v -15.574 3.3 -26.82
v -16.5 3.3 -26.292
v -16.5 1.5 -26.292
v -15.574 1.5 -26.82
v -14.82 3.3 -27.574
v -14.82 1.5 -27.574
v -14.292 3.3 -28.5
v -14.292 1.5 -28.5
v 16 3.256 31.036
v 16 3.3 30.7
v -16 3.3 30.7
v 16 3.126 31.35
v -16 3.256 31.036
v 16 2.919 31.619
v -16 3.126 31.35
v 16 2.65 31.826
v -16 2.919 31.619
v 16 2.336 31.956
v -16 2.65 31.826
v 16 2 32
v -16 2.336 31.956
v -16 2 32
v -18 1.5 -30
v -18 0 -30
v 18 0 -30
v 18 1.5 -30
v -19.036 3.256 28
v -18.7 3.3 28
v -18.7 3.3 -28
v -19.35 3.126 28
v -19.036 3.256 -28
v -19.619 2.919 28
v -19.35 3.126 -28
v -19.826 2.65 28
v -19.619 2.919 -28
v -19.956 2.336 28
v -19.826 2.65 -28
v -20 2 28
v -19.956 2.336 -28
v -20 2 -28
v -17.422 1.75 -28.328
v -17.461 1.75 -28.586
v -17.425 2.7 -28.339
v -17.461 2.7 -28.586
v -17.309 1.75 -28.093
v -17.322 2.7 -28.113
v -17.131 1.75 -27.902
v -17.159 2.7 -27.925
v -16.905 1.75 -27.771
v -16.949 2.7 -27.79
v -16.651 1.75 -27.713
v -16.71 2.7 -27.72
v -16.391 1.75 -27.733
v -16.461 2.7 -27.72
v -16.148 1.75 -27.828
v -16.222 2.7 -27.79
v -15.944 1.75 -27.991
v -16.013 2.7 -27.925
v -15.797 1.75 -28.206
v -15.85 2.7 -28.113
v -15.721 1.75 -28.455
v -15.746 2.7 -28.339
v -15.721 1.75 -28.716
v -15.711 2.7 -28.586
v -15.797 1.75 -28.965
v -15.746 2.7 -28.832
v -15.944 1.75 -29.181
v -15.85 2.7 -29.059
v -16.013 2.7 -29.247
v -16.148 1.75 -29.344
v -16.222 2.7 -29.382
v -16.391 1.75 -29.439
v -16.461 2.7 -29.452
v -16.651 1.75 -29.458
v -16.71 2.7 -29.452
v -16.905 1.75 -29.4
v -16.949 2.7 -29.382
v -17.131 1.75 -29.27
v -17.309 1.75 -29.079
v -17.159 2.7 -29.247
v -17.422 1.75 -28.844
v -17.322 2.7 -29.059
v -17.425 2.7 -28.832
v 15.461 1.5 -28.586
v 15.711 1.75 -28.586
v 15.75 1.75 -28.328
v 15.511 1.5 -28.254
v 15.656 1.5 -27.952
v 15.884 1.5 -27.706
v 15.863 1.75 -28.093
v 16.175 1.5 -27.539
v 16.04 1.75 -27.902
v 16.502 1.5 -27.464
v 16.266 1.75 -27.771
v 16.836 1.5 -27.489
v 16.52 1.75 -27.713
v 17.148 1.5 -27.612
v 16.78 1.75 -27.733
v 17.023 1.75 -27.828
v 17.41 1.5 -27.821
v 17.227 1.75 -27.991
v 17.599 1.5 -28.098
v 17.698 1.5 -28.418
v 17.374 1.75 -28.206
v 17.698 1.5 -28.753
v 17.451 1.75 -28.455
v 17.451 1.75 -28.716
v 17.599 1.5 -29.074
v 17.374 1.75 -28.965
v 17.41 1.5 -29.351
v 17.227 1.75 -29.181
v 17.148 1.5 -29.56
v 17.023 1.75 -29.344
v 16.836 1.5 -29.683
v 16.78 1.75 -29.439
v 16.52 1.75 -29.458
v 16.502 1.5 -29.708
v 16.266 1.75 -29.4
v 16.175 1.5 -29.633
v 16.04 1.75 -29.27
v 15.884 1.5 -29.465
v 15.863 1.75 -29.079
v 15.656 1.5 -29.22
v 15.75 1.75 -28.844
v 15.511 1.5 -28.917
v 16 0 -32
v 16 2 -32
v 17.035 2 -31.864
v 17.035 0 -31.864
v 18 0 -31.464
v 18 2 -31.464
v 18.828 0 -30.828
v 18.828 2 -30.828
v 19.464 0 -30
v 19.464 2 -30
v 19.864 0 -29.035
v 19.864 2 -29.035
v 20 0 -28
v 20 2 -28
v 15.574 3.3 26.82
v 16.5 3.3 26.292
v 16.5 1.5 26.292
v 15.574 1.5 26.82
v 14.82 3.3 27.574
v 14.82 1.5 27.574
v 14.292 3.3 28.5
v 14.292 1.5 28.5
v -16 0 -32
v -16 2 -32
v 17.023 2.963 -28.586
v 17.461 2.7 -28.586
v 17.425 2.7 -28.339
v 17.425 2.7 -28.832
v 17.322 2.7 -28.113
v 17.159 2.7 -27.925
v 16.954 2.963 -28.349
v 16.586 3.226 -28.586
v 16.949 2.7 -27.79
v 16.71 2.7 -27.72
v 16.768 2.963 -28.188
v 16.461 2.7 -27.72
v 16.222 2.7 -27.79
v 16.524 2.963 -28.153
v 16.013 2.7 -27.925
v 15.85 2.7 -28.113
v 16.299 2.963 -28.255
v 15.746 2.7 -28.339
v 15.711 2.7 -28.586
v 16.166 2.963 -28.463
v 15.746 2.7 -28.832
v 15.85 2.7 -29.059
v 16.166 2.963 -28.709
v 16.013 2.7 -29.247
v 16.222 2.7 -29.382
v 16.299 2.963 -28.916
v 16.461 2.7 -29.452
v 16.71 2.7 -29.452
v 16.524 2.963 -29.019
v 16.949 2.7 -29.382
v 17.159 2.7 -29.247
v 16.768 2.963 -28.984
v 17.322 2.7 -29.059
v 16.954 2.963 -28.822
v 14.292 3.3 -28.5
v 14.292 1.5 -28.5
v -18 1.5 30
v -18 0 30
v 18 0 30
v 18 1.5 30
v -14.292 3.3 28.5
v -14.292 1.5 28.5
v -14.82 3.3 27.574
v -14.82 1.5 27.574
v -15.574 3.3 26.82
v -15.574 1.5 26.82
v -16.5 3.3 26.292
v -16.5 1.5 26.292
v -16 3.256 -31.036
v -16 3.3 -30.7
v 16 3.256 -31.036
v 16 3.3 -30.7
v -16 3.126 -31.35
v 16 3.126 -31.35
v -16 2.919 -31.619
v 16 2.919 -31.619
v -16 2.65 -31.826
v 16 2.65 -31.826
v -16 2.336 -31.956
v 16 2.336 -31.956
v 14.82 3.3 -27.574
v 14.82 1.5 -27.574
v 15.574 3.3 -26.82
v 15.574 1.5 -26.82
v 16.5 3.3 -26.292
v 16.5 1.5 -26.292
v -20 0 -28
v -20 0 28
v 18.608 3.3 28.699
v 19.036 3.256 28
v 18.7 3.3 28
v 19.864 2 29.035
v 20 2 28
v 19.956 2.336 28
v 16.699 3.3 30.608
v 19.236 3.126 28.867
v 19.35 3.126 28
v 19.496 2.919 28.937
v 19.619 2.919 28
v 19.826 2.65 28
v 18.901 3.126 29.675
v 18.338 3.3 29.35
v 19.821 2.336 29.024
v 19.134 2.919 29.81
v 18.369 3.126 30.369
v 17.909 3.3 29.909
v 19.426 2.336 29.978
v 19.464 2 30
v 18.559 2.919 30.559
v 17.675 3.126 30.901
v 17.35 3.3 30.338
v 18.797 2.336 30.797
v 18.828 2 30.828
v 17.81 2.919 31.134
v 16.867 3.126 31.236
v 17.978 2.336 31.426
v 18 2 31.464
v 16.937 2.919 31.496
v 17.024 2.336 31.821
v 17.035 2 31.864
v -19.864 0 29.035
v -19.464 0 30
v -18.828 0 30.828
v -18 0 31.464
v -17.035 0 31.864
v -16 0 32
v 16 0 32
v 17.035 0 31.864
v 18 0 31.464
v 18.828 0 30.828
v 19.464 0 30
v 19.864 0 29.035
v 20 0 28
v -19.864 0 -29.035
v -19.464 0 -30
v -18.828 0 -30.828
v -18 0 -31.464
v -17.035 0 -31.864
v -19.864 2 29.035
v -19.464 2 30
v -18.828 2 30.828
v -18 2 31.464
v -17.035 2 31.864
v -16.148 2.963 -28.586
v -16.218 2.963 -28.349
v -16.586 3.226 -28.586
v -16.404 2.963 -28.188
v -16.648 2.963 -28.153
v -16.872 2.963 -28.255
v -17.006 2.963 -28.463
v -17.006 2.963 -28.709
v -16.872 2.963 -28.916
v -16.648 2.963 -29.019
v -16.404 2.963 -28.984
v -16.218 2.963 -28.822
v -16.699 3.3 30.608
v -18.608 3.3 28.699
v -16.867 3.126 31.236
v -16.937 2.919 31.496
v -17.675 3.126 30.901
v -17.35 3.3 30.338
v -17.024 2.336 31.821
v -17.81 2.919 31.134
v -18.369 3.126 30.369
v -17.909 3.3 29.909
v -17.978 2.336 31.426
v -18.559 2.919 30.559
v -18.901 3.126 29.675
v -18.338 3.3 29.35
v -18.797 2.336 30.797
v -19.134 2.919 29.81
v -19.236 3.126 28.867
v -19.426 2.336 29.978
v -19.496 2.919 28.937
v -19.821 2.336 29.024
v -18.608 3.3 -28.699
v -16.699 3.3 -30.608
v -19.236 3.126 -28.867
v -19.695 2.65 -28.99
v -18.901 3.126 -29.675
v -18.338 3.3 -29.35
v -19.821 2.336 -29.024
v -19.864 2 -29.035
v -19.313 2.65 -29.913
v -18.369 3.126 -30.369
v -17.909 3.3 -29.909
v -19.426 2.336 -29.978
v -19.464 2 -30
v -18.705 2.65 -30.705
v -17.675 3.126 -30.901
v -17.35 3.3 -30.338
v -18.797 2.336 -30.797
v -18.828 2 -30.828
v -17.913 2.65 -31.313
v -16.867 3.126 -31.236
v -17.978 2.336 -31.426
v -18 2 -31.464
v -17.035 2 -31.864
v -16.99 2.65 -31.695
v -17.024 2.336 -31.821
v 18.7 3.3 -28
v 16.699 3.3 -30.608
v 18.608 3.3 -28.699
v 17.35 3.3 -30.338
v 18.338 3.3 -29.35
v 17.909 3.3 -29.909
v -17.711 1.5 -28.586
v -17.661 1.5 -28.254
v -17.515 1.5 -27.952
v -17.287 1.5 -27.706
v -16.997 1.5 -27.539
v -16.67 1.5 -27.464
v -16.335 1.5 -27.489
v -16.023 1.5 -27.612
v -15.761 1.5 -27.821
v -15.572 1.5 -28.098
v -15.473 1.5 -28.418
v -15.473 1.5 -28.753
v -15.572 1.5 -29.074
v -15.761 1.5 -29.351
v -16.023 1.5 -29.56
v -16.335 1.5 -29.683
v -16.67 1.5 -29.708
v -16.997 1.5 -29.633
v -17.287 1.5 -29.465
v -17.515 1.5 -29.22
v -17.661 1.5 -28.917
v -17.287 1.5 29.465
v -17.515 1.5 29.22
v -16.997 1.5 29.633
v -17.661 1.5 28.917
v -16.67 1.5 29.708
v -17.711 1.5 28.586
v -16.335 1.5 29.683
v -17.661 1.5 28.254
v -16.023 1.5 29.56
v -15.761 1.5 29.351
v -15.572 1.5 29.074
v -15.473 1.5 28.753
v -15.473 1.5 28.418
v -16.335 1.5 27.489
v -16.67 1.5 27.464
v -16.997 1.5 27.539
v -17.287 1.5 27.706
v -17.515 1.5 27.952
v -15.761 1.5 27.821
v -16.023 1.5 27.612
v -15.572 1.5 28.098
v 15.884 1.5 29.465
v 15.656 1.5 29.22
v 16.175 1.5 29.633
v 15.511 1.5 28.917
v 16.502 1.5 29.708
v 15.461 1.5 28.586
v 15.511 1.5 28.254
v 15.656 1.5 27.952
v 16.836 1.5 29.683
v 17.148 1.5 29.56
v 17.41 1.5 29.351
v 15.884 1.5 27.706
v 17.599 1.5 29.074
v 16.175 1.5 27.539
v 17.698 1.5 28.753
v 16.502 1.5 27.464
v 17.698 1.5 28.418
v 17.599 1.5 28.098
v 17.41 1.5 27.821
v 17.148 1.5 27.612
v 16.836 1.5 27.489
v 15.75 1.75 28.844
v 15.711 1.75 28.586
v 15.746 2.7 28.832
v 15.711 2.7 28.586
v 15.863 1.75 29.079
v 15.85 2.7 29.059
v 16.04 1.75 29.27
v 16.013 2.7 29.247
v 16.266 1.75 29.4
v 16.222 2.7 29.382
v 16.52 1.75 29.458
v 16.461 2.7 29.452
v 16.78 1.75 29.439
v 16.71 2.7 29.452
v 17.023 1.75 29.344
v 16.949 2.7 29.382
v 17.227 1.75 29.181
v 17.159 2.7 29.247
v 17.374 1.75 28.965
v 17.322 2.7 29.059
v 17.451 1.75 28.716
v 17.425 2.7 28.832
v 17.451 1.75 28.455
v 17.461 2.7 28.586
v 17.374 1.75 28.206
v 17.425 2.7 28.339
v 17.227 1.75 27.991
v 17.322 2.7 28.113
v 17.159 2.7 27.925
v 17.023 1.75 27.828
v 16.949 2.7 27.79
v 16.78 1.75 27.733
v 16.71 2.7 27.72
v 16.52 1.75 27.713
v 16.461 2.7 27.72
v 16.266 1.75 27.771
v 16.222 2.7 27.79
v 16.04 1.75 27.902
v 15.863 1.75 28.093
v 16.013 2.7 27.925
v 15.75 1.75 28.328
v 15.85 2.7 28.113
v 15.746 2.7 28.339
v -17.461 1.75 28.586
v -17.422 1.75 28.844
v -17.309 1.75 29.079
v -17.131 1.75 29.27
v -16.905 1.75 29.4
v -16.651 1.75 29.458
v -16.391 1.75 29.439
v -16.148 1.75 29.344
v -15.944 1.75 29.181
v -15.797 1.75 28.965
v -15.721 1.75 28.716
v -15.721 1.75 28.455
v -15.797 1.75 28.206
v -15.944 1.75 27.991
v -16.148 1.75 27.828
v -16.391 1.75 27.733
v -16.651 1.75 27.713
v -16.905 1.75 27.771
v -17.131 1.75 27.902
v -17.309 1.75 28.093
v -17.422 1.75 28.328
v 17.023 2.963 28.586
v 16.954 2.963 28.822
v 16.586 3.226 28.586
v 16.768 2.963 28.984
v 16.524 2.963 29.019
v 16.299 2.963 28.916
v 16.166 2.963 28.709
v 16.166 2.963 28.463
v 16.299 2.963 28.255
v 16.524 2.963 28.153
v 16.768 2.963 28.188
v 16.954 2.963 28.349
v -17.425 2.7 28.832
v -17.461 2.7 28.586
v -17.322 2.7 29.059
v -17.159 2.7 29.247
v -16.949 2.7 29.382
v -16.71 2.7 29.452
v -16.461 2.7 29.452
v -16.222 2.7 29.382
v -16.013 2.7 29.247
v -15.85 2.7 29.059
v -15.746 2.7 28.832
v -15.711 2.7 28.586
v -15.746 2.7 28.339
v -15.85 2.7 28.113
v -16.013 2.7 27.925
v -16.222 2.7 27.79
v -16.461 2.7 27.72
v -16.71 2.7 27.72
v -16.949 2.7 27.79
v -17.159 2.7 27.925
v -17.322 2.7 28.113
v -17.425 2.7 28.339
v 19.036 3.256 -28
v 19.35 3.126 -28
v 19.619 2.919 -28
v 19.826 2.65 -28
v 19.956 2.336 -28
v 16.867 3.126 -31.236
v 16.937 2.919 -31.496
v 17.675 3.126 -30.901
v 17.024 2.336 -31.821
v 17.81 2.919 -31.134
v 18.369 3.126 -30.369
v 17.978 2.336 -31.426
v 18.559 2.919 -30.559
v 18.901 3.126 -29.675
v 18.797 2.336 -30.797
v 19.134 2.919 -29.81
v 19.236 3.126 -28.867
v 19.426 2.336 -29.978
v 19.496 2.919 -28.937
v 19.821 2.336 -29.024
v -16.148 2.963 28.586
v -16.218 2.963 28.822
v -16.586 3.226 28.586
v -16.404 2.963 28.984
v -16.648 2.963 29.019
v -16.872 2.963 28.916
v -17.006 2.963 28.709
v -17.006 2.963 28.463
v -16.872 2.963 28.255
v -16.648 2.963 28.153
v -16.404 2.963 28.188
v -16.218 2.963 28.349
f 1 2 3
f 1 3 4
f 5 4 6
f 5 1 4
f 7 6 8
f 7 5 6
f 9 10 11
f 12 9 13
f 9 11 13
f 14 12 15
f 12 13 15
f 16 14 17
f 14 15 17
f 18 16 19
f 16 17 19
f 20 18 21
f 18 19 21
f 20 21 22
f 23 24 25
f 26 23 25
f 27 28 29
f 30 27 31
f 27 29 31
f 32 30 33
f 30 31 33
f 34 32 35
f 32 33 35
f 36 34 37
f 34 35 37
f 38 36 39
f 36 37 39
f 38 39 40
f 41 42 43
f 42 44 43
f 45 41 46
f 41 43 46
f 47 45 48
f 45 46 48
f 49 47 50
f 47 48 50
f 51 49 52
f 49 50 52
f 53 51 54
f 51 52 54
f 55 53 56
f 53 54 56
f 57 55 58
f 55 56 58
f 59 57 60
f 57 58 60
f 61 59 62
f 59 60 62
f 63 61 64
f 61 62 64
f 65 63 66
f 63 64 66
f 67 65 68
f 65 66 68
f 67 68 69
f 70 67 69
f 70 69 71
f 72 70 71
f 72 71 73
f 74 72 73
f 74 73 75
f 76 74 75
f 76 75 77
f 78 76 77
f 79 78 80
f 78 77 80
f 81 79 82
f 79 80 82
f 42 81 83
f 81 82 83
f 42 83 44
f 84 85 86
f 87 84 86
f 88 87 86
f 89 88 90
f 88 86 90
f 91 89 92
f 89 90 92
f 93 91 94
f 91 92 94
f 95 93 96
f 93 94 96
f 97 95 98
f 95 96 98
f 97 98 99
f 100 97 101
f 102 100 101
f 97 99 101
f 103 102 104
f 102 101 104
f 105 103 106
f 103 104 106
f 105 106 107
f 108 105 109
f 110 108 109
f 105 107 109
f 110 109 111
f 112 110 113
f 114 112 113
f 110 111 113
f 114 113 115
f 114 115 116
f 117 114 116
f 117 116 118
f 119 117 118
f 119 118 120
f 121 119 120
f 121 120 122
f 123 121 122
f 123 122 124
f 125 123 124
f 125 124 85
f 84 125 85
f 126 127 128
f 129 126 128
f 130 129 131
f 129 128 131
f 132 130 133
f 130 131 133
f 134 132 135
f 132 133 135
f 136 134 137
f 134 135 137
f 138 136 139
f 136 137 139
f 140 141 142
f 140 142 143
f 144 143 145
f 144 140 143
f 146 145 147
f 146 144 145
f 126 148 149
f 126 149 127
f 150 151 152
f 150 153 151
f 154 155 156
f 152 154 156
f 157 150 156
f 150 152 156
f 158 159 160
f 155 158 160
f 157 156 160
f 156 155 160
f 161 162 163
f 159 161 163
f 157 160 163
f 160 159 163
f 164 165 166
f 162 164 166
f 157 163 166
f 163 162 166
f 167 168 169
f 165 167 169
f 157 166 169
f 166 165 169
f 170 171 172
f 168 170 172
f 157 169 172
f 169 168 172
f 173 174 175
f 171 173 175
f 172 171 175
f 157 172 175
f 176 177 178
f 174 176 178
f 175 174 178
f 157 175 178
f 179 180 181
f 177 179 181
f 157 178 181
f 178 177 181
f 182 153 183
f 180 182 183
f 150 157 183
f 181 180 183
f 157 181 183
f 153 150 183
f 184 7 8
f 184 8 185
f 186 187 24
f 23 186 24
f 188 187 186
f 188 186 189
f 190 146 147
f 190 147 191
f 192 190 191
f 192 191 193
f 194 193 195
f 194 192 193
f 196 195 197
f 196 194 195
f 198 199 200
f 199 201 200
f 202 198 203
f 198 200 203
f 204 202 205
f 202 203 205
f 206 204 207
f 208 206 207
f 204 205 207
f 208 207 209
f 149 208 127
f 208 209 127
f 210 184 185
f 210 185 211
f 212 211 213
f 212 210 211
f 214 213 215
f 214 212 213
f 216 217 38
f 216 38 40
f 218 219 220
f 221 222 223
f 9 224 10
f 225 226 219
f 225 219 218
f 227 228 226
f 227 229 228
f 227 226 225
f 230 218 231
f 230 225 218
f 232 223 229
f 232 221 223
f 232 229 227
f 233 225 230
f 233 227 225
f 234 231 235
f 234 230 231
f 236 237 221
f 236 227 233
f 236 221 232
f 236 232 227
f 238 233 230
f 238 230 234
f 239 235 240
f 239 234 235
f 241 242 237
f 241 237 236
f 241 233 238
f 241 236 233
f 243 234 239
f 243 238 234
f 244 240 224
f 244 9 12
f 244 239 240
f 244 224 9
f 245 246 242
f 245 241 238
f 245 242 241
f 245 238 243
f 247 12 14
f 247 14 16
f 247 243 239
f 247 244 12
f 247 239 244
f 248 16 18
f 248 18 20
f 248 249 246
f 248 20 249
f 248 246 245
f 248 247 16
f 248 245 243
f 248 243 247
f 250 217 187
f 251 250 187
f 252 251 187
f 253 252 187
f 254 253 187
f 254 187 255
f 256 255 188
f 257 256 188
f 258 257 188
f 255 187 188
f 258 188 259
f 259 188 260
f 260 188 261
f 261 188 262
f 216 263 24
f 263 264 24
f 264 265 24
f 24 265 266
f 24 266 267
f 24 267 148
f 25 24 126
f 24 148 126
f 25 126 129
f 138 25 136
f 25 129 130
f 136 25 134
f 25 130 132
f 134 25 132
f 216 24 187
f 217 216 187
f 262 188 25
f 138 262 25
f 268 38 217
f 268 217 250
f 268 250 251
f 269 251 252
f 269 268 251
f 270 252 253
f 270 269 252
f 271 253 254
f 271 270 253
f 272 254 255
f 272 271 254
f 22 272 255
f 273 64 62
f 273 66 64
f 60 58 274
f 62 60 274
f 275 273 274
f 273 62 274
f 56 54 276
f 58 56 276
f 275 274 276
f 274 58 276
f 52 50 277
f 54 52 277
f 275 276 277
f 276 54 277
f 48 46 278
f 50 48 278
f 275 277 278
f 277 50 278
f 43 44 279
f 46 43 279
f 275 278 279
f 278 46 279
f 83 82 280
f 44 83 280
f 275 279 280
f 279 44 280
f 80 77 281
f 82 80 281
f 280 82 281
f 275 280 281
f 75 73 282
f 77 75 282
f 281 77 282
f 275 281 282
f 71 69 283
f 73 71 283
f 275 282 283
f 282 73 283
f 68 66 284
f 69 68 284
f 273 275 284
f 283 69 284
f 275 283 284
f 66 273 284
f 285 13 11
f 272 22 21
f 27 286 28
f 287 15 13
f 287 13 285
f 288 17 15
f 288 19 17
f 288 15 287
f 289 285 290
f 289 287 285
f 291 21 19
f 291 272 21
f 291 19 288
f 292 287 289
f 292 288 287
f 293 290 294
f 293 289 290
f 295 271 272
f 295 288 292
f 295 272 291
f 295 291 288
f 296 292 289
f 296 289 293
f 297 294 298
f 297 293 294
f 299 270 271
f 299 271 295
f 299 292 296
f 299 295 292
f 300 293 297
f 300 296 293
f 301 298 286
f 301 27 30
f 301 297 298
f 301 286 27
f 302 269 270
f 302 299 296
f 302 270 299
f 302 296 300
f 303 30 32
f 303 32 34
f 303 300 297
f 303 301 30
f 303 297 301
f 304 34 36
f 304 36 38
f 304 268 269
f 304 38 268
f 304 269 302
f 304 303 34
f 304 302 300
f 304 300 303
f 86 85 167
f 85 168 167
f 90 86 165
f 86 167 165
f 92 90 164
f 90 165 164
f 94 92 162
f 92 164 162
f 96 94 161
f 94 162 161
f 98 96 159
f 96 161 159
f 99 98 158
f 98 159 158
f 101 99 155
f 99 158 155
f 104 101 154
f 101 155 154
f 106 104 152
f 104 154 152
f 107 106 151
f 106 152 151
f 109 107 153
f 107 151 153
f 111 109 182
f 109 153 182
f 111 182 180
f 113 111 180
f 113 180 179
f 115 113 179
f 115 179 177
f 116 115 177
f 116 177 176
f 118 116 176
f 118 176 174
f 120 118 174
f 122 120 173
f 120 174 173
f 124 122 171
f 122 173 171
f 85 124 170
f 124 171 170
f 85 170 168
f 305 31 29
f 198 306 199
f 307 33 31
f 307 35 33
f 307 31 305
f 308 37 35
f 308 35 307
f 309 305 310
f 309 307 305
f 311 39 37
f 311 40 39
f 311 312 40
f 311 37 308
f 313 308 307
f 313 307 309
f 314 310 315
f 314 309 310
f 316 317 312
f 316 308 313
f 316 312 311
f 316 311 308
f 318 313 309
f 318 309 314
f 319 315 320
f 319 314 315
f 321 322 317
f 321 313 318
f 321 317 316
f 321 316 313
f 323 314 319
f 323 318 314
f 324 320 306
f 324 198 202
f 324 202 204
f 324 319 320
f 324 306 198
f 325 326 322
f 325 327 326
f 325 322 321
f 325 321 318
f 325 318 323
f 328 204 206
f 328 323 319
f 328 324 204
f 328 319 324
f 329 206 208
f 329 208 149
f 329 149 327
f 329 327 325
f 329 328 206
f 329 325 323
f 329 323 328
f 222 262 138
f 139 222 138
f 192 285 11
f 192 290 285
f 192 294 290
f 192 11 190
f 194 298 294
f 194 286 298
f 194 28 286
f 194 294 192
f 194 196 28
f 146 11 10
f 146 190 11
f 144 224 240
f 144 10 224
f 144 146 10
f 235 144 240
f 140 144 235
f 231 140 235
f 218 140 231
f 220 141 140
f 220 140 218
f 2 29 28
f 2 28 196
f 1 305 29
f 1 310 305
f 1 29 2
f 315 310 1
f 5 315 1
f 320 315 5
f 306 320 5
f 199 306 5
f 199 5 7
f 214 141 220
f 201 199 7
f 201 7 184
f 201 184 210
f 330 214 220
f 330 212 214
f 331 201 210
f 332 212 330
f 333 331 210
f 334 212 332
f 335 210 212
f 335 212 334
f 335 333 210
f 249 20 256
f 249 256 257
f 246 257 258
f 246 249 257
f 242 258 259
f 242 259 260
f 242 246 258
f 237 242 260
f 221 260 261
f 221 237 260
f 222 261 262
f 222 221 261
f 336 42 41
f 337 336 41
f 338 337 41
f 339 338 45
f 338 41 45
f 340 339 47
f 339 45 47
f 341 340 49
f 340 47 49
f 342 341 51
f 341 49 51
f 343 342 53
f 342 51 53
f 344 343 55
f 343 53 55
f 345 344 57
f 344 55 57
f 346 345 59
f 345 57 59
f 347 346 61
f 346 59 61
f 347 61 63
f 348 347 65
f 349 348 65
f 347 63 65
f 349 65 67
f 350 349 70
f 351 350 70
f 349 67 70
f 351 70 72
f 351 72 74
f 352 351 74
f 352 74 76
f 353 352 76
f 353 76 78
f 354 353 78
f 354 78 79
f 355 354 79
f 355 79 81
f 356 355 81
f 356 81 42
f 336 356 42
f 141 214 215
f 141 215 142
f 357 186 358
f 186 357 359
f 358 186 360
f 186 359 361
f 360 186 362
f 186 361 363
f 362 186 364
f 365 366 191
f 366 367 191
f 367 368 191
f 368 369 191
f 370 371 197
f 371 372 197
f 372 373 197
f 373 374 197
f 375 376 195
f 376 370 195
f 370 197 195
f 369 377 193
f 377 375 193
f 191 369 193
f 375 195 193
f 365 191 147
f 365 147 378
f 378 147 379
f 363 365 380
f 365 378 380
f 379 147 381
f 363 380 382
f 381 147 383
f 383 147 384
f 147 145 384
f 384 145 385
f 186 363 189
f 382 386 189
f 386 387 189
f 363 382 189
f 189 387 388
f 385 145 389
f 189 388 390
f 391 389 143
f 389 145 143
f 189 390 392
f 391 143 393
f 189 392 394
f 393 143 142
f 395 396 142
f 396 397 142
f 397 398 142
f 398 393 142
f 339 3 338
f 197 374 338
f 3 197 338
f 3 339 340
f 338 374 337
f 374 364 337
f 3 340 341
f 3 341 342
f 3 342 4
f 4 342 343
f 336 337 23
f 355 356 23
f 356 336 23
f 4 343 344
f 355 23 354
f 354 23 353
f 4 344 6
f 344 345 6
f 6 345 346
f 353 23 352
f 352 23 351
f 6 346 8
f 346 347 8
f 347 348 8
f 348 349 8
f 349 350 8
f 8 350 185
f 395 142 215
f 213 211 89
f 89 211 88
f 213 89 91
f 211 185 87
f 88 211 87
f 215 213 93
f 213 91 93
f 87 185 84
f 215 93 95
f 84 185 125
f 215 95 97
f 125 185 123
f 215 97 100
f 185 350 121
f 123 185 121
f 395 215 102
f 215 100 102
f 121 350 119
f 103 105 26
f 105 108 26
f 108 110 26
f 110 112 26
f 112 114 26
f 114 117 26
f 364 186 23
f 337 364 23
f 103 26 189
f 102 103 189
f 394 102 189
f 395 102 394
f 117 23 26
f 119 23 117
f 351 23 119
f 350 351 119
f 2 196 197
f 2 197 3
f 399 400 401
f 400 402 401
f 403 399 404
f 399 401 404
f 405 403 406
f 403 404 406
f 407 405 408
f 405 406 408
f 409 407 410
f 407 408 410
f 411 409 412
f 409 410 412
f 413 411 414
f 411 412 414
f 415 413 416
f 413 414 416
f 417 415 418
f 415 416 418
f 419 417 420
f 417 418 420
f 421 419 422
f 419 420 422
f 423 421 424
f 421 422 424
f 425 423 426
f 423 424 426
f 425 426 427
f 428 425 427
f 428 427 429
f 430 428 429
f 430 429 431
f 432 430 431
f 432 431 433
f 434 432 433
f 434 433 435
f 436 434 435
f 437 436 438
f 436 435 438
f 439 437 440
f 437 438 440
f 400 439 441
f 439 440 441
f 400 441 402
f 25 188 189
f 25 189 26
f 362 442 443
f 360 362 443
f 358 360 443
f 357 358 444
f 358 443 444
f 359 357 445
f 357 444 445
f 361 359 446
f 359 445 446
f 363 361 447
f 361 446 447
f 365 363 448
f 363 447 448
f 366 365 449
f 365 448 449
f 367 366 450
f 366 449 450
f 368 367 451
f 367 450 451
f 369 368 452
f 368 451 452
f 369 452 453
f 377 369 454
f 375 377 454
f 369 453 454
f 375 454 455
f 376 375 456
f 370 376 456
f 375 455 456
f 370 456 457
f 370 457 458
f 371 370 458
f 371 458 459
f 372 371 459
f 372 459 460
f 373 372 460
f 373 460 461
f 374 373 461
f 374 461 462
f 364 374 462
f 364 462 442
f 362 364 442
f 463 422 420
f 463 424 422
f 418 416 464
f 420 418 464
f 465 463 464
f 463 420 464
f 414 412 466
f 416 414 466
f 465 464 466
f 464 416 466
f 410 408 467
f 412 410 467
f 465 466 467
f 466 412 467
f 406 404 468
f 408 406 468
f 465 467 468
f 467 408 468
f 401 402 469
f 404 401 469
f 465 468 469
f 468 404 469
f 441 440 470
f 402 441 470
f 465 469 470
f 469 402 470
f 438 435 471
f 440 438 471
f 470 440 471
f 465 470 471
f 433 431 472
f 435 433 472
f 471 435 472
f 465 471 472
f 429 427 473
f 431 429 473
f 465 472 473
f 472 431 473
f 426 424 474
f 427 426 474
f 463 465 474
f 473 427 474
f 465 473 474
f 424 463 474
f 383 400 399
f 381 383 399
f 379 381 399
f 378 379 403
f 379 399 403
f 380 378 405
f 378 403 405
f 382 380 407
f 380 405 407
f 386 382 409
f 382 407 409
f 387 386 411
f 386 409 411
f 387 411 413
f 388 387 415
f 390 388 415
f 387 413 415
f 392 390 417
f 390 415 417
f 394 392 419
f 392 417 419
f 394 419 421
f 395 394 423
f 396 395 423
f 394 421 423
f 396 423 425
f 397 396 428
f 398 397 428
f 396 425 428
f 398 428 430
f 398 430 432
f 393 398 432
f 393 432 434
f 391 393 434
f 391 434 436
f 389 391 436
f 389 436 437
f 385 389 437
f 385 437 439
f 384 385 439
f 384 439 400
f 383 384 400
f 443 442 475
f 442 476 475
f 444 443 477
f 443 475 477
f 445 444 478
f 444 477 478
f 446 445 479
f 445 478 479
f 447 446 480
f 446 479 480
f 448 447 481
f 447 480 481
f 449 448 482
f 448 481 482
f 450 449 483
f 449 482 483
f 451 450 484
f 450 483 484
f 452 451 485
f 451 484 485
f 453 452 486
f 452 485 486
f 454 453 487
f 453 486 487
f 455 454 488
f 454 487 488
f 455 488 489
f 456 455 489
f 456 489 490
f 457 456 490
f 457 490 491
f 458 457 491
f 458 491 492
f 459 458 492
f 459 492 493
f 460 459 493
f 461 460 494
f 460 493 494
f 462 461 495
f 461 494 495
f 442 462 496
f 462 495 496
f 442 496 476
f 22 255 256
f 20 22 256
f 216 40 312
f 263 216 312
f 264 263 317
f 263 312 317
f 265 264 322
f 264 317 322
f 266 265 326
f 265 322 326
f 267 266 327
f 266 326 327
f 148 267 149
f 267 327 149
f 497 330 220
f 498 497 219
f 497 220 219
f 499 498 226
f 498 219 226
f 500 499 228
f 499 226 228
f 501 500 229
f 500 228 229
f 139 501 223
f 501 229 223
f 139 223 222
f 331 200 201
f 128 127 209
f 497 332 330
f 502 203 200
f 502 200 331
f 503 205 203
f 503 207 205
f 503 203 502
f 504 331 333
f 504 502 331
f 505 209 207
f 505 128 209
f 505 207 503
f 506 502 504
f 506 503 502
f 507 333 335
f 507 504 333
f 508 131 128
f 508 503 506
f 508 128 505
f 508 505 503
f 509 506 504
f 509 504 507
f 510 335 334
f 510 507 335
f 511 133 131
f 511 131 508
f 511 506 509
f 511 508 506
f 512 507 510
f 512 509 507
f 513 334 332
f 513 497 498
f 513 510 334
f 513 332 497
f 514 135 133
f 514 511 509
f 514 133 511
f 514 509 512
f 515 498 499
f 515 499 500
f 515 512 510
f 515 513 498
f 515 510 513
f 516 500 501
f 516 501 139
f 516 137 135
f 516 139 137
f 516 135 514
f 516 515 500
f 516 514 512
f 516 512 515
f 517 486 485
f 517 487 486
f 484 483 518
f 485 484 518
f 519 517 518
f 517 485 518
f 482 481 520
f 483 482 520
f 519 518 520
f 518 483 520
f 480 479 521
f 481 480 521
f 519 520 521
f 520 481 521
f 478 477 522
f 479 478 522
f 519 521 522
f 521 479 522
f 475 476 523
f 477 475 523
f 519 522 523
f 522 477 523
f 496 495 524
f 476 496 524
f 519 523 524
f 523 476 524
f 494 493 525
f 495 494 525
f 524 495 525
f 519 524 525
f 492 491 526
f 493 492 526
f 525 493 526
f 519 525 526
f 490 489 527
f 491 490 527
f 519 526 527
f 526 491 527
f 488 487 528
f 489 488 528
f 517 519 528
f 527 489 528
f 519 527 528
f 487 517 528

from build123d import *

# Parameters (mm, degrees)
SKETCH1_W                          = 40
SKETCH1_H                          = 64
SKETCH1_W_2                        = 36
SKETCH1_H_2                        = 60
BOSS_EXTRUDE1_DEPTH                = 3.3
SKETCH3_W                          = 36
SKETCH3_H                          = 60
BOSS_EXTRUDE2_DEPTH                = 1.8
FILLET1_R                          = 4
M2_2X0_45_TAPPED_HOLE1_D           = 1.75
M2_2X0_45_TAPPED_HOLE1_DEPTH       = 1.2
M2_2X0_45_TAPPED_HOLE1_CSINK_D     = 2.25
M2_2X0_45_TAPPED_HOLE1_CSINK_ANGLE = 90
M2_2X0_45_TAPPED_HOLE1_TIP         = 0.525753042
FILLET3_R                          = 1.3


with BuildPart() as part:
    # Sketch1 → Boss-Extrude1 (new body)
    with BuildSketch(Plane(origin=(0, 0, 0), x_dir=(1, 0, 0), z_dir=(0, 1, 0))):
        Rectangle(SKETCH1_W, SKETCH1_H)
        Rectangle(SKETCH1_W_2, SKETCH1_H_2, mode=Mode.SUBTRACT)
    extrude(amount=BOSS_EXTRUDE1_DEPTH)

    # Sketch3 → Boss-Extrude2 (add)
    with BuildSketch(Plane(origin=(0, 3.3, 0), x_dir=(1, 0, 0), z_dir=(0, 1, 0))):
        Rectangle(SKETCH3_W, SKETCH3_H)
        with BuildLine():
            ThreePointArc((14.291900756, 28.5), (15.171572875, 27.171572875), (16.5, 26.291900756))
            Line((16.5, 26.291900756), (16.5, -26.291900756))
            ThreePointArc((16.5, -26.291900756), (15.171572875, -27.171572875), (14.291900756, -28.5))
            Line((14.291900756, -28.5), (-14.291900756, -28.5))
            ThreePointArc((-14.291900756, -28.5), (-15.171572875, -27.171572875), (-16.5, -26.291900756))
            Line((-16.5, -26.291900756), (-16.5, 26.291900756))
            ThreePointArc((-16.5, 26.291900756), (-15.171572875, 27.171572875), (-14.291900756, 28.5))
            Line((-14.291900756, 28.5), (14.291900756, 28.5))
        make_face(mode=Mode.SUBTRACT)
    extrude(amount=-BOSS_EXTRUDE2_DEPTH)

    # Fillet1
    fillet1_edges = [part.edges().sort_by_distance(p)[0] for p in [
        (-20, 1.65, -32),
        (20, 1.65, -32),
        (20, 1.65, 32),
        (-20, 1.65, 32),
    ]]
    fillet(fillet1_edges, radius=FILLET1_R)

    # M2.2x0.45 Tapped Hole1
    with Locations(Plane.XZ.offset(-1.5)):
        with Locations((-16.585786438, 28.585786438), (16.585786438, 28.585786438), (-16.585786438, -28.585786438), (16.585786438, -28.585786438)):
            CounterSinkHole(M2_2X0_45_TAPPED_HOLE1_D / 2, M2_2X0_45_TAPPED_HOLE1_CSINK_D / 2, depth=M2_2X0_45_TAPPED_HOLE1_DEPTH, counter_sink_angle=M2_2X0_45_TAPPED_HOLE1_CSINK_ANGLE)
            with Locations((0, 0, -(M2_2X0_45_TAPPED_HOLE1_DEPTH + M2_2X0_45_TAPPED_HOLE1_TIP / 2))):  # 118° drill point
                Cone(0, M2_2X0_45_TAPPED_HOLE1_D / 2, M2_2X0_45_TAPPED_HOLE1_TIP, mode=Mode.SUBTRACT)

    # Fillet3
    fillet3_edges = [part.edges().sort_by_distance(p)[0] for p in [
        (0, 3.3, -32),
        (20, 3.3, 0),
        (-20, 3.3, 0),
        (0, 3.3, 32),
        (-18.828427125, 3.3, 30.828427125),
        (18.828427125, 3.3, 30.828427125),
        (-18.828427125, 3.3, -30.828427125),
        (18.828427125, 3.3, -30.828427125),
    ]]
    fillet(fillet3_edges, radius=FILLET3_R)


solid = part.part
